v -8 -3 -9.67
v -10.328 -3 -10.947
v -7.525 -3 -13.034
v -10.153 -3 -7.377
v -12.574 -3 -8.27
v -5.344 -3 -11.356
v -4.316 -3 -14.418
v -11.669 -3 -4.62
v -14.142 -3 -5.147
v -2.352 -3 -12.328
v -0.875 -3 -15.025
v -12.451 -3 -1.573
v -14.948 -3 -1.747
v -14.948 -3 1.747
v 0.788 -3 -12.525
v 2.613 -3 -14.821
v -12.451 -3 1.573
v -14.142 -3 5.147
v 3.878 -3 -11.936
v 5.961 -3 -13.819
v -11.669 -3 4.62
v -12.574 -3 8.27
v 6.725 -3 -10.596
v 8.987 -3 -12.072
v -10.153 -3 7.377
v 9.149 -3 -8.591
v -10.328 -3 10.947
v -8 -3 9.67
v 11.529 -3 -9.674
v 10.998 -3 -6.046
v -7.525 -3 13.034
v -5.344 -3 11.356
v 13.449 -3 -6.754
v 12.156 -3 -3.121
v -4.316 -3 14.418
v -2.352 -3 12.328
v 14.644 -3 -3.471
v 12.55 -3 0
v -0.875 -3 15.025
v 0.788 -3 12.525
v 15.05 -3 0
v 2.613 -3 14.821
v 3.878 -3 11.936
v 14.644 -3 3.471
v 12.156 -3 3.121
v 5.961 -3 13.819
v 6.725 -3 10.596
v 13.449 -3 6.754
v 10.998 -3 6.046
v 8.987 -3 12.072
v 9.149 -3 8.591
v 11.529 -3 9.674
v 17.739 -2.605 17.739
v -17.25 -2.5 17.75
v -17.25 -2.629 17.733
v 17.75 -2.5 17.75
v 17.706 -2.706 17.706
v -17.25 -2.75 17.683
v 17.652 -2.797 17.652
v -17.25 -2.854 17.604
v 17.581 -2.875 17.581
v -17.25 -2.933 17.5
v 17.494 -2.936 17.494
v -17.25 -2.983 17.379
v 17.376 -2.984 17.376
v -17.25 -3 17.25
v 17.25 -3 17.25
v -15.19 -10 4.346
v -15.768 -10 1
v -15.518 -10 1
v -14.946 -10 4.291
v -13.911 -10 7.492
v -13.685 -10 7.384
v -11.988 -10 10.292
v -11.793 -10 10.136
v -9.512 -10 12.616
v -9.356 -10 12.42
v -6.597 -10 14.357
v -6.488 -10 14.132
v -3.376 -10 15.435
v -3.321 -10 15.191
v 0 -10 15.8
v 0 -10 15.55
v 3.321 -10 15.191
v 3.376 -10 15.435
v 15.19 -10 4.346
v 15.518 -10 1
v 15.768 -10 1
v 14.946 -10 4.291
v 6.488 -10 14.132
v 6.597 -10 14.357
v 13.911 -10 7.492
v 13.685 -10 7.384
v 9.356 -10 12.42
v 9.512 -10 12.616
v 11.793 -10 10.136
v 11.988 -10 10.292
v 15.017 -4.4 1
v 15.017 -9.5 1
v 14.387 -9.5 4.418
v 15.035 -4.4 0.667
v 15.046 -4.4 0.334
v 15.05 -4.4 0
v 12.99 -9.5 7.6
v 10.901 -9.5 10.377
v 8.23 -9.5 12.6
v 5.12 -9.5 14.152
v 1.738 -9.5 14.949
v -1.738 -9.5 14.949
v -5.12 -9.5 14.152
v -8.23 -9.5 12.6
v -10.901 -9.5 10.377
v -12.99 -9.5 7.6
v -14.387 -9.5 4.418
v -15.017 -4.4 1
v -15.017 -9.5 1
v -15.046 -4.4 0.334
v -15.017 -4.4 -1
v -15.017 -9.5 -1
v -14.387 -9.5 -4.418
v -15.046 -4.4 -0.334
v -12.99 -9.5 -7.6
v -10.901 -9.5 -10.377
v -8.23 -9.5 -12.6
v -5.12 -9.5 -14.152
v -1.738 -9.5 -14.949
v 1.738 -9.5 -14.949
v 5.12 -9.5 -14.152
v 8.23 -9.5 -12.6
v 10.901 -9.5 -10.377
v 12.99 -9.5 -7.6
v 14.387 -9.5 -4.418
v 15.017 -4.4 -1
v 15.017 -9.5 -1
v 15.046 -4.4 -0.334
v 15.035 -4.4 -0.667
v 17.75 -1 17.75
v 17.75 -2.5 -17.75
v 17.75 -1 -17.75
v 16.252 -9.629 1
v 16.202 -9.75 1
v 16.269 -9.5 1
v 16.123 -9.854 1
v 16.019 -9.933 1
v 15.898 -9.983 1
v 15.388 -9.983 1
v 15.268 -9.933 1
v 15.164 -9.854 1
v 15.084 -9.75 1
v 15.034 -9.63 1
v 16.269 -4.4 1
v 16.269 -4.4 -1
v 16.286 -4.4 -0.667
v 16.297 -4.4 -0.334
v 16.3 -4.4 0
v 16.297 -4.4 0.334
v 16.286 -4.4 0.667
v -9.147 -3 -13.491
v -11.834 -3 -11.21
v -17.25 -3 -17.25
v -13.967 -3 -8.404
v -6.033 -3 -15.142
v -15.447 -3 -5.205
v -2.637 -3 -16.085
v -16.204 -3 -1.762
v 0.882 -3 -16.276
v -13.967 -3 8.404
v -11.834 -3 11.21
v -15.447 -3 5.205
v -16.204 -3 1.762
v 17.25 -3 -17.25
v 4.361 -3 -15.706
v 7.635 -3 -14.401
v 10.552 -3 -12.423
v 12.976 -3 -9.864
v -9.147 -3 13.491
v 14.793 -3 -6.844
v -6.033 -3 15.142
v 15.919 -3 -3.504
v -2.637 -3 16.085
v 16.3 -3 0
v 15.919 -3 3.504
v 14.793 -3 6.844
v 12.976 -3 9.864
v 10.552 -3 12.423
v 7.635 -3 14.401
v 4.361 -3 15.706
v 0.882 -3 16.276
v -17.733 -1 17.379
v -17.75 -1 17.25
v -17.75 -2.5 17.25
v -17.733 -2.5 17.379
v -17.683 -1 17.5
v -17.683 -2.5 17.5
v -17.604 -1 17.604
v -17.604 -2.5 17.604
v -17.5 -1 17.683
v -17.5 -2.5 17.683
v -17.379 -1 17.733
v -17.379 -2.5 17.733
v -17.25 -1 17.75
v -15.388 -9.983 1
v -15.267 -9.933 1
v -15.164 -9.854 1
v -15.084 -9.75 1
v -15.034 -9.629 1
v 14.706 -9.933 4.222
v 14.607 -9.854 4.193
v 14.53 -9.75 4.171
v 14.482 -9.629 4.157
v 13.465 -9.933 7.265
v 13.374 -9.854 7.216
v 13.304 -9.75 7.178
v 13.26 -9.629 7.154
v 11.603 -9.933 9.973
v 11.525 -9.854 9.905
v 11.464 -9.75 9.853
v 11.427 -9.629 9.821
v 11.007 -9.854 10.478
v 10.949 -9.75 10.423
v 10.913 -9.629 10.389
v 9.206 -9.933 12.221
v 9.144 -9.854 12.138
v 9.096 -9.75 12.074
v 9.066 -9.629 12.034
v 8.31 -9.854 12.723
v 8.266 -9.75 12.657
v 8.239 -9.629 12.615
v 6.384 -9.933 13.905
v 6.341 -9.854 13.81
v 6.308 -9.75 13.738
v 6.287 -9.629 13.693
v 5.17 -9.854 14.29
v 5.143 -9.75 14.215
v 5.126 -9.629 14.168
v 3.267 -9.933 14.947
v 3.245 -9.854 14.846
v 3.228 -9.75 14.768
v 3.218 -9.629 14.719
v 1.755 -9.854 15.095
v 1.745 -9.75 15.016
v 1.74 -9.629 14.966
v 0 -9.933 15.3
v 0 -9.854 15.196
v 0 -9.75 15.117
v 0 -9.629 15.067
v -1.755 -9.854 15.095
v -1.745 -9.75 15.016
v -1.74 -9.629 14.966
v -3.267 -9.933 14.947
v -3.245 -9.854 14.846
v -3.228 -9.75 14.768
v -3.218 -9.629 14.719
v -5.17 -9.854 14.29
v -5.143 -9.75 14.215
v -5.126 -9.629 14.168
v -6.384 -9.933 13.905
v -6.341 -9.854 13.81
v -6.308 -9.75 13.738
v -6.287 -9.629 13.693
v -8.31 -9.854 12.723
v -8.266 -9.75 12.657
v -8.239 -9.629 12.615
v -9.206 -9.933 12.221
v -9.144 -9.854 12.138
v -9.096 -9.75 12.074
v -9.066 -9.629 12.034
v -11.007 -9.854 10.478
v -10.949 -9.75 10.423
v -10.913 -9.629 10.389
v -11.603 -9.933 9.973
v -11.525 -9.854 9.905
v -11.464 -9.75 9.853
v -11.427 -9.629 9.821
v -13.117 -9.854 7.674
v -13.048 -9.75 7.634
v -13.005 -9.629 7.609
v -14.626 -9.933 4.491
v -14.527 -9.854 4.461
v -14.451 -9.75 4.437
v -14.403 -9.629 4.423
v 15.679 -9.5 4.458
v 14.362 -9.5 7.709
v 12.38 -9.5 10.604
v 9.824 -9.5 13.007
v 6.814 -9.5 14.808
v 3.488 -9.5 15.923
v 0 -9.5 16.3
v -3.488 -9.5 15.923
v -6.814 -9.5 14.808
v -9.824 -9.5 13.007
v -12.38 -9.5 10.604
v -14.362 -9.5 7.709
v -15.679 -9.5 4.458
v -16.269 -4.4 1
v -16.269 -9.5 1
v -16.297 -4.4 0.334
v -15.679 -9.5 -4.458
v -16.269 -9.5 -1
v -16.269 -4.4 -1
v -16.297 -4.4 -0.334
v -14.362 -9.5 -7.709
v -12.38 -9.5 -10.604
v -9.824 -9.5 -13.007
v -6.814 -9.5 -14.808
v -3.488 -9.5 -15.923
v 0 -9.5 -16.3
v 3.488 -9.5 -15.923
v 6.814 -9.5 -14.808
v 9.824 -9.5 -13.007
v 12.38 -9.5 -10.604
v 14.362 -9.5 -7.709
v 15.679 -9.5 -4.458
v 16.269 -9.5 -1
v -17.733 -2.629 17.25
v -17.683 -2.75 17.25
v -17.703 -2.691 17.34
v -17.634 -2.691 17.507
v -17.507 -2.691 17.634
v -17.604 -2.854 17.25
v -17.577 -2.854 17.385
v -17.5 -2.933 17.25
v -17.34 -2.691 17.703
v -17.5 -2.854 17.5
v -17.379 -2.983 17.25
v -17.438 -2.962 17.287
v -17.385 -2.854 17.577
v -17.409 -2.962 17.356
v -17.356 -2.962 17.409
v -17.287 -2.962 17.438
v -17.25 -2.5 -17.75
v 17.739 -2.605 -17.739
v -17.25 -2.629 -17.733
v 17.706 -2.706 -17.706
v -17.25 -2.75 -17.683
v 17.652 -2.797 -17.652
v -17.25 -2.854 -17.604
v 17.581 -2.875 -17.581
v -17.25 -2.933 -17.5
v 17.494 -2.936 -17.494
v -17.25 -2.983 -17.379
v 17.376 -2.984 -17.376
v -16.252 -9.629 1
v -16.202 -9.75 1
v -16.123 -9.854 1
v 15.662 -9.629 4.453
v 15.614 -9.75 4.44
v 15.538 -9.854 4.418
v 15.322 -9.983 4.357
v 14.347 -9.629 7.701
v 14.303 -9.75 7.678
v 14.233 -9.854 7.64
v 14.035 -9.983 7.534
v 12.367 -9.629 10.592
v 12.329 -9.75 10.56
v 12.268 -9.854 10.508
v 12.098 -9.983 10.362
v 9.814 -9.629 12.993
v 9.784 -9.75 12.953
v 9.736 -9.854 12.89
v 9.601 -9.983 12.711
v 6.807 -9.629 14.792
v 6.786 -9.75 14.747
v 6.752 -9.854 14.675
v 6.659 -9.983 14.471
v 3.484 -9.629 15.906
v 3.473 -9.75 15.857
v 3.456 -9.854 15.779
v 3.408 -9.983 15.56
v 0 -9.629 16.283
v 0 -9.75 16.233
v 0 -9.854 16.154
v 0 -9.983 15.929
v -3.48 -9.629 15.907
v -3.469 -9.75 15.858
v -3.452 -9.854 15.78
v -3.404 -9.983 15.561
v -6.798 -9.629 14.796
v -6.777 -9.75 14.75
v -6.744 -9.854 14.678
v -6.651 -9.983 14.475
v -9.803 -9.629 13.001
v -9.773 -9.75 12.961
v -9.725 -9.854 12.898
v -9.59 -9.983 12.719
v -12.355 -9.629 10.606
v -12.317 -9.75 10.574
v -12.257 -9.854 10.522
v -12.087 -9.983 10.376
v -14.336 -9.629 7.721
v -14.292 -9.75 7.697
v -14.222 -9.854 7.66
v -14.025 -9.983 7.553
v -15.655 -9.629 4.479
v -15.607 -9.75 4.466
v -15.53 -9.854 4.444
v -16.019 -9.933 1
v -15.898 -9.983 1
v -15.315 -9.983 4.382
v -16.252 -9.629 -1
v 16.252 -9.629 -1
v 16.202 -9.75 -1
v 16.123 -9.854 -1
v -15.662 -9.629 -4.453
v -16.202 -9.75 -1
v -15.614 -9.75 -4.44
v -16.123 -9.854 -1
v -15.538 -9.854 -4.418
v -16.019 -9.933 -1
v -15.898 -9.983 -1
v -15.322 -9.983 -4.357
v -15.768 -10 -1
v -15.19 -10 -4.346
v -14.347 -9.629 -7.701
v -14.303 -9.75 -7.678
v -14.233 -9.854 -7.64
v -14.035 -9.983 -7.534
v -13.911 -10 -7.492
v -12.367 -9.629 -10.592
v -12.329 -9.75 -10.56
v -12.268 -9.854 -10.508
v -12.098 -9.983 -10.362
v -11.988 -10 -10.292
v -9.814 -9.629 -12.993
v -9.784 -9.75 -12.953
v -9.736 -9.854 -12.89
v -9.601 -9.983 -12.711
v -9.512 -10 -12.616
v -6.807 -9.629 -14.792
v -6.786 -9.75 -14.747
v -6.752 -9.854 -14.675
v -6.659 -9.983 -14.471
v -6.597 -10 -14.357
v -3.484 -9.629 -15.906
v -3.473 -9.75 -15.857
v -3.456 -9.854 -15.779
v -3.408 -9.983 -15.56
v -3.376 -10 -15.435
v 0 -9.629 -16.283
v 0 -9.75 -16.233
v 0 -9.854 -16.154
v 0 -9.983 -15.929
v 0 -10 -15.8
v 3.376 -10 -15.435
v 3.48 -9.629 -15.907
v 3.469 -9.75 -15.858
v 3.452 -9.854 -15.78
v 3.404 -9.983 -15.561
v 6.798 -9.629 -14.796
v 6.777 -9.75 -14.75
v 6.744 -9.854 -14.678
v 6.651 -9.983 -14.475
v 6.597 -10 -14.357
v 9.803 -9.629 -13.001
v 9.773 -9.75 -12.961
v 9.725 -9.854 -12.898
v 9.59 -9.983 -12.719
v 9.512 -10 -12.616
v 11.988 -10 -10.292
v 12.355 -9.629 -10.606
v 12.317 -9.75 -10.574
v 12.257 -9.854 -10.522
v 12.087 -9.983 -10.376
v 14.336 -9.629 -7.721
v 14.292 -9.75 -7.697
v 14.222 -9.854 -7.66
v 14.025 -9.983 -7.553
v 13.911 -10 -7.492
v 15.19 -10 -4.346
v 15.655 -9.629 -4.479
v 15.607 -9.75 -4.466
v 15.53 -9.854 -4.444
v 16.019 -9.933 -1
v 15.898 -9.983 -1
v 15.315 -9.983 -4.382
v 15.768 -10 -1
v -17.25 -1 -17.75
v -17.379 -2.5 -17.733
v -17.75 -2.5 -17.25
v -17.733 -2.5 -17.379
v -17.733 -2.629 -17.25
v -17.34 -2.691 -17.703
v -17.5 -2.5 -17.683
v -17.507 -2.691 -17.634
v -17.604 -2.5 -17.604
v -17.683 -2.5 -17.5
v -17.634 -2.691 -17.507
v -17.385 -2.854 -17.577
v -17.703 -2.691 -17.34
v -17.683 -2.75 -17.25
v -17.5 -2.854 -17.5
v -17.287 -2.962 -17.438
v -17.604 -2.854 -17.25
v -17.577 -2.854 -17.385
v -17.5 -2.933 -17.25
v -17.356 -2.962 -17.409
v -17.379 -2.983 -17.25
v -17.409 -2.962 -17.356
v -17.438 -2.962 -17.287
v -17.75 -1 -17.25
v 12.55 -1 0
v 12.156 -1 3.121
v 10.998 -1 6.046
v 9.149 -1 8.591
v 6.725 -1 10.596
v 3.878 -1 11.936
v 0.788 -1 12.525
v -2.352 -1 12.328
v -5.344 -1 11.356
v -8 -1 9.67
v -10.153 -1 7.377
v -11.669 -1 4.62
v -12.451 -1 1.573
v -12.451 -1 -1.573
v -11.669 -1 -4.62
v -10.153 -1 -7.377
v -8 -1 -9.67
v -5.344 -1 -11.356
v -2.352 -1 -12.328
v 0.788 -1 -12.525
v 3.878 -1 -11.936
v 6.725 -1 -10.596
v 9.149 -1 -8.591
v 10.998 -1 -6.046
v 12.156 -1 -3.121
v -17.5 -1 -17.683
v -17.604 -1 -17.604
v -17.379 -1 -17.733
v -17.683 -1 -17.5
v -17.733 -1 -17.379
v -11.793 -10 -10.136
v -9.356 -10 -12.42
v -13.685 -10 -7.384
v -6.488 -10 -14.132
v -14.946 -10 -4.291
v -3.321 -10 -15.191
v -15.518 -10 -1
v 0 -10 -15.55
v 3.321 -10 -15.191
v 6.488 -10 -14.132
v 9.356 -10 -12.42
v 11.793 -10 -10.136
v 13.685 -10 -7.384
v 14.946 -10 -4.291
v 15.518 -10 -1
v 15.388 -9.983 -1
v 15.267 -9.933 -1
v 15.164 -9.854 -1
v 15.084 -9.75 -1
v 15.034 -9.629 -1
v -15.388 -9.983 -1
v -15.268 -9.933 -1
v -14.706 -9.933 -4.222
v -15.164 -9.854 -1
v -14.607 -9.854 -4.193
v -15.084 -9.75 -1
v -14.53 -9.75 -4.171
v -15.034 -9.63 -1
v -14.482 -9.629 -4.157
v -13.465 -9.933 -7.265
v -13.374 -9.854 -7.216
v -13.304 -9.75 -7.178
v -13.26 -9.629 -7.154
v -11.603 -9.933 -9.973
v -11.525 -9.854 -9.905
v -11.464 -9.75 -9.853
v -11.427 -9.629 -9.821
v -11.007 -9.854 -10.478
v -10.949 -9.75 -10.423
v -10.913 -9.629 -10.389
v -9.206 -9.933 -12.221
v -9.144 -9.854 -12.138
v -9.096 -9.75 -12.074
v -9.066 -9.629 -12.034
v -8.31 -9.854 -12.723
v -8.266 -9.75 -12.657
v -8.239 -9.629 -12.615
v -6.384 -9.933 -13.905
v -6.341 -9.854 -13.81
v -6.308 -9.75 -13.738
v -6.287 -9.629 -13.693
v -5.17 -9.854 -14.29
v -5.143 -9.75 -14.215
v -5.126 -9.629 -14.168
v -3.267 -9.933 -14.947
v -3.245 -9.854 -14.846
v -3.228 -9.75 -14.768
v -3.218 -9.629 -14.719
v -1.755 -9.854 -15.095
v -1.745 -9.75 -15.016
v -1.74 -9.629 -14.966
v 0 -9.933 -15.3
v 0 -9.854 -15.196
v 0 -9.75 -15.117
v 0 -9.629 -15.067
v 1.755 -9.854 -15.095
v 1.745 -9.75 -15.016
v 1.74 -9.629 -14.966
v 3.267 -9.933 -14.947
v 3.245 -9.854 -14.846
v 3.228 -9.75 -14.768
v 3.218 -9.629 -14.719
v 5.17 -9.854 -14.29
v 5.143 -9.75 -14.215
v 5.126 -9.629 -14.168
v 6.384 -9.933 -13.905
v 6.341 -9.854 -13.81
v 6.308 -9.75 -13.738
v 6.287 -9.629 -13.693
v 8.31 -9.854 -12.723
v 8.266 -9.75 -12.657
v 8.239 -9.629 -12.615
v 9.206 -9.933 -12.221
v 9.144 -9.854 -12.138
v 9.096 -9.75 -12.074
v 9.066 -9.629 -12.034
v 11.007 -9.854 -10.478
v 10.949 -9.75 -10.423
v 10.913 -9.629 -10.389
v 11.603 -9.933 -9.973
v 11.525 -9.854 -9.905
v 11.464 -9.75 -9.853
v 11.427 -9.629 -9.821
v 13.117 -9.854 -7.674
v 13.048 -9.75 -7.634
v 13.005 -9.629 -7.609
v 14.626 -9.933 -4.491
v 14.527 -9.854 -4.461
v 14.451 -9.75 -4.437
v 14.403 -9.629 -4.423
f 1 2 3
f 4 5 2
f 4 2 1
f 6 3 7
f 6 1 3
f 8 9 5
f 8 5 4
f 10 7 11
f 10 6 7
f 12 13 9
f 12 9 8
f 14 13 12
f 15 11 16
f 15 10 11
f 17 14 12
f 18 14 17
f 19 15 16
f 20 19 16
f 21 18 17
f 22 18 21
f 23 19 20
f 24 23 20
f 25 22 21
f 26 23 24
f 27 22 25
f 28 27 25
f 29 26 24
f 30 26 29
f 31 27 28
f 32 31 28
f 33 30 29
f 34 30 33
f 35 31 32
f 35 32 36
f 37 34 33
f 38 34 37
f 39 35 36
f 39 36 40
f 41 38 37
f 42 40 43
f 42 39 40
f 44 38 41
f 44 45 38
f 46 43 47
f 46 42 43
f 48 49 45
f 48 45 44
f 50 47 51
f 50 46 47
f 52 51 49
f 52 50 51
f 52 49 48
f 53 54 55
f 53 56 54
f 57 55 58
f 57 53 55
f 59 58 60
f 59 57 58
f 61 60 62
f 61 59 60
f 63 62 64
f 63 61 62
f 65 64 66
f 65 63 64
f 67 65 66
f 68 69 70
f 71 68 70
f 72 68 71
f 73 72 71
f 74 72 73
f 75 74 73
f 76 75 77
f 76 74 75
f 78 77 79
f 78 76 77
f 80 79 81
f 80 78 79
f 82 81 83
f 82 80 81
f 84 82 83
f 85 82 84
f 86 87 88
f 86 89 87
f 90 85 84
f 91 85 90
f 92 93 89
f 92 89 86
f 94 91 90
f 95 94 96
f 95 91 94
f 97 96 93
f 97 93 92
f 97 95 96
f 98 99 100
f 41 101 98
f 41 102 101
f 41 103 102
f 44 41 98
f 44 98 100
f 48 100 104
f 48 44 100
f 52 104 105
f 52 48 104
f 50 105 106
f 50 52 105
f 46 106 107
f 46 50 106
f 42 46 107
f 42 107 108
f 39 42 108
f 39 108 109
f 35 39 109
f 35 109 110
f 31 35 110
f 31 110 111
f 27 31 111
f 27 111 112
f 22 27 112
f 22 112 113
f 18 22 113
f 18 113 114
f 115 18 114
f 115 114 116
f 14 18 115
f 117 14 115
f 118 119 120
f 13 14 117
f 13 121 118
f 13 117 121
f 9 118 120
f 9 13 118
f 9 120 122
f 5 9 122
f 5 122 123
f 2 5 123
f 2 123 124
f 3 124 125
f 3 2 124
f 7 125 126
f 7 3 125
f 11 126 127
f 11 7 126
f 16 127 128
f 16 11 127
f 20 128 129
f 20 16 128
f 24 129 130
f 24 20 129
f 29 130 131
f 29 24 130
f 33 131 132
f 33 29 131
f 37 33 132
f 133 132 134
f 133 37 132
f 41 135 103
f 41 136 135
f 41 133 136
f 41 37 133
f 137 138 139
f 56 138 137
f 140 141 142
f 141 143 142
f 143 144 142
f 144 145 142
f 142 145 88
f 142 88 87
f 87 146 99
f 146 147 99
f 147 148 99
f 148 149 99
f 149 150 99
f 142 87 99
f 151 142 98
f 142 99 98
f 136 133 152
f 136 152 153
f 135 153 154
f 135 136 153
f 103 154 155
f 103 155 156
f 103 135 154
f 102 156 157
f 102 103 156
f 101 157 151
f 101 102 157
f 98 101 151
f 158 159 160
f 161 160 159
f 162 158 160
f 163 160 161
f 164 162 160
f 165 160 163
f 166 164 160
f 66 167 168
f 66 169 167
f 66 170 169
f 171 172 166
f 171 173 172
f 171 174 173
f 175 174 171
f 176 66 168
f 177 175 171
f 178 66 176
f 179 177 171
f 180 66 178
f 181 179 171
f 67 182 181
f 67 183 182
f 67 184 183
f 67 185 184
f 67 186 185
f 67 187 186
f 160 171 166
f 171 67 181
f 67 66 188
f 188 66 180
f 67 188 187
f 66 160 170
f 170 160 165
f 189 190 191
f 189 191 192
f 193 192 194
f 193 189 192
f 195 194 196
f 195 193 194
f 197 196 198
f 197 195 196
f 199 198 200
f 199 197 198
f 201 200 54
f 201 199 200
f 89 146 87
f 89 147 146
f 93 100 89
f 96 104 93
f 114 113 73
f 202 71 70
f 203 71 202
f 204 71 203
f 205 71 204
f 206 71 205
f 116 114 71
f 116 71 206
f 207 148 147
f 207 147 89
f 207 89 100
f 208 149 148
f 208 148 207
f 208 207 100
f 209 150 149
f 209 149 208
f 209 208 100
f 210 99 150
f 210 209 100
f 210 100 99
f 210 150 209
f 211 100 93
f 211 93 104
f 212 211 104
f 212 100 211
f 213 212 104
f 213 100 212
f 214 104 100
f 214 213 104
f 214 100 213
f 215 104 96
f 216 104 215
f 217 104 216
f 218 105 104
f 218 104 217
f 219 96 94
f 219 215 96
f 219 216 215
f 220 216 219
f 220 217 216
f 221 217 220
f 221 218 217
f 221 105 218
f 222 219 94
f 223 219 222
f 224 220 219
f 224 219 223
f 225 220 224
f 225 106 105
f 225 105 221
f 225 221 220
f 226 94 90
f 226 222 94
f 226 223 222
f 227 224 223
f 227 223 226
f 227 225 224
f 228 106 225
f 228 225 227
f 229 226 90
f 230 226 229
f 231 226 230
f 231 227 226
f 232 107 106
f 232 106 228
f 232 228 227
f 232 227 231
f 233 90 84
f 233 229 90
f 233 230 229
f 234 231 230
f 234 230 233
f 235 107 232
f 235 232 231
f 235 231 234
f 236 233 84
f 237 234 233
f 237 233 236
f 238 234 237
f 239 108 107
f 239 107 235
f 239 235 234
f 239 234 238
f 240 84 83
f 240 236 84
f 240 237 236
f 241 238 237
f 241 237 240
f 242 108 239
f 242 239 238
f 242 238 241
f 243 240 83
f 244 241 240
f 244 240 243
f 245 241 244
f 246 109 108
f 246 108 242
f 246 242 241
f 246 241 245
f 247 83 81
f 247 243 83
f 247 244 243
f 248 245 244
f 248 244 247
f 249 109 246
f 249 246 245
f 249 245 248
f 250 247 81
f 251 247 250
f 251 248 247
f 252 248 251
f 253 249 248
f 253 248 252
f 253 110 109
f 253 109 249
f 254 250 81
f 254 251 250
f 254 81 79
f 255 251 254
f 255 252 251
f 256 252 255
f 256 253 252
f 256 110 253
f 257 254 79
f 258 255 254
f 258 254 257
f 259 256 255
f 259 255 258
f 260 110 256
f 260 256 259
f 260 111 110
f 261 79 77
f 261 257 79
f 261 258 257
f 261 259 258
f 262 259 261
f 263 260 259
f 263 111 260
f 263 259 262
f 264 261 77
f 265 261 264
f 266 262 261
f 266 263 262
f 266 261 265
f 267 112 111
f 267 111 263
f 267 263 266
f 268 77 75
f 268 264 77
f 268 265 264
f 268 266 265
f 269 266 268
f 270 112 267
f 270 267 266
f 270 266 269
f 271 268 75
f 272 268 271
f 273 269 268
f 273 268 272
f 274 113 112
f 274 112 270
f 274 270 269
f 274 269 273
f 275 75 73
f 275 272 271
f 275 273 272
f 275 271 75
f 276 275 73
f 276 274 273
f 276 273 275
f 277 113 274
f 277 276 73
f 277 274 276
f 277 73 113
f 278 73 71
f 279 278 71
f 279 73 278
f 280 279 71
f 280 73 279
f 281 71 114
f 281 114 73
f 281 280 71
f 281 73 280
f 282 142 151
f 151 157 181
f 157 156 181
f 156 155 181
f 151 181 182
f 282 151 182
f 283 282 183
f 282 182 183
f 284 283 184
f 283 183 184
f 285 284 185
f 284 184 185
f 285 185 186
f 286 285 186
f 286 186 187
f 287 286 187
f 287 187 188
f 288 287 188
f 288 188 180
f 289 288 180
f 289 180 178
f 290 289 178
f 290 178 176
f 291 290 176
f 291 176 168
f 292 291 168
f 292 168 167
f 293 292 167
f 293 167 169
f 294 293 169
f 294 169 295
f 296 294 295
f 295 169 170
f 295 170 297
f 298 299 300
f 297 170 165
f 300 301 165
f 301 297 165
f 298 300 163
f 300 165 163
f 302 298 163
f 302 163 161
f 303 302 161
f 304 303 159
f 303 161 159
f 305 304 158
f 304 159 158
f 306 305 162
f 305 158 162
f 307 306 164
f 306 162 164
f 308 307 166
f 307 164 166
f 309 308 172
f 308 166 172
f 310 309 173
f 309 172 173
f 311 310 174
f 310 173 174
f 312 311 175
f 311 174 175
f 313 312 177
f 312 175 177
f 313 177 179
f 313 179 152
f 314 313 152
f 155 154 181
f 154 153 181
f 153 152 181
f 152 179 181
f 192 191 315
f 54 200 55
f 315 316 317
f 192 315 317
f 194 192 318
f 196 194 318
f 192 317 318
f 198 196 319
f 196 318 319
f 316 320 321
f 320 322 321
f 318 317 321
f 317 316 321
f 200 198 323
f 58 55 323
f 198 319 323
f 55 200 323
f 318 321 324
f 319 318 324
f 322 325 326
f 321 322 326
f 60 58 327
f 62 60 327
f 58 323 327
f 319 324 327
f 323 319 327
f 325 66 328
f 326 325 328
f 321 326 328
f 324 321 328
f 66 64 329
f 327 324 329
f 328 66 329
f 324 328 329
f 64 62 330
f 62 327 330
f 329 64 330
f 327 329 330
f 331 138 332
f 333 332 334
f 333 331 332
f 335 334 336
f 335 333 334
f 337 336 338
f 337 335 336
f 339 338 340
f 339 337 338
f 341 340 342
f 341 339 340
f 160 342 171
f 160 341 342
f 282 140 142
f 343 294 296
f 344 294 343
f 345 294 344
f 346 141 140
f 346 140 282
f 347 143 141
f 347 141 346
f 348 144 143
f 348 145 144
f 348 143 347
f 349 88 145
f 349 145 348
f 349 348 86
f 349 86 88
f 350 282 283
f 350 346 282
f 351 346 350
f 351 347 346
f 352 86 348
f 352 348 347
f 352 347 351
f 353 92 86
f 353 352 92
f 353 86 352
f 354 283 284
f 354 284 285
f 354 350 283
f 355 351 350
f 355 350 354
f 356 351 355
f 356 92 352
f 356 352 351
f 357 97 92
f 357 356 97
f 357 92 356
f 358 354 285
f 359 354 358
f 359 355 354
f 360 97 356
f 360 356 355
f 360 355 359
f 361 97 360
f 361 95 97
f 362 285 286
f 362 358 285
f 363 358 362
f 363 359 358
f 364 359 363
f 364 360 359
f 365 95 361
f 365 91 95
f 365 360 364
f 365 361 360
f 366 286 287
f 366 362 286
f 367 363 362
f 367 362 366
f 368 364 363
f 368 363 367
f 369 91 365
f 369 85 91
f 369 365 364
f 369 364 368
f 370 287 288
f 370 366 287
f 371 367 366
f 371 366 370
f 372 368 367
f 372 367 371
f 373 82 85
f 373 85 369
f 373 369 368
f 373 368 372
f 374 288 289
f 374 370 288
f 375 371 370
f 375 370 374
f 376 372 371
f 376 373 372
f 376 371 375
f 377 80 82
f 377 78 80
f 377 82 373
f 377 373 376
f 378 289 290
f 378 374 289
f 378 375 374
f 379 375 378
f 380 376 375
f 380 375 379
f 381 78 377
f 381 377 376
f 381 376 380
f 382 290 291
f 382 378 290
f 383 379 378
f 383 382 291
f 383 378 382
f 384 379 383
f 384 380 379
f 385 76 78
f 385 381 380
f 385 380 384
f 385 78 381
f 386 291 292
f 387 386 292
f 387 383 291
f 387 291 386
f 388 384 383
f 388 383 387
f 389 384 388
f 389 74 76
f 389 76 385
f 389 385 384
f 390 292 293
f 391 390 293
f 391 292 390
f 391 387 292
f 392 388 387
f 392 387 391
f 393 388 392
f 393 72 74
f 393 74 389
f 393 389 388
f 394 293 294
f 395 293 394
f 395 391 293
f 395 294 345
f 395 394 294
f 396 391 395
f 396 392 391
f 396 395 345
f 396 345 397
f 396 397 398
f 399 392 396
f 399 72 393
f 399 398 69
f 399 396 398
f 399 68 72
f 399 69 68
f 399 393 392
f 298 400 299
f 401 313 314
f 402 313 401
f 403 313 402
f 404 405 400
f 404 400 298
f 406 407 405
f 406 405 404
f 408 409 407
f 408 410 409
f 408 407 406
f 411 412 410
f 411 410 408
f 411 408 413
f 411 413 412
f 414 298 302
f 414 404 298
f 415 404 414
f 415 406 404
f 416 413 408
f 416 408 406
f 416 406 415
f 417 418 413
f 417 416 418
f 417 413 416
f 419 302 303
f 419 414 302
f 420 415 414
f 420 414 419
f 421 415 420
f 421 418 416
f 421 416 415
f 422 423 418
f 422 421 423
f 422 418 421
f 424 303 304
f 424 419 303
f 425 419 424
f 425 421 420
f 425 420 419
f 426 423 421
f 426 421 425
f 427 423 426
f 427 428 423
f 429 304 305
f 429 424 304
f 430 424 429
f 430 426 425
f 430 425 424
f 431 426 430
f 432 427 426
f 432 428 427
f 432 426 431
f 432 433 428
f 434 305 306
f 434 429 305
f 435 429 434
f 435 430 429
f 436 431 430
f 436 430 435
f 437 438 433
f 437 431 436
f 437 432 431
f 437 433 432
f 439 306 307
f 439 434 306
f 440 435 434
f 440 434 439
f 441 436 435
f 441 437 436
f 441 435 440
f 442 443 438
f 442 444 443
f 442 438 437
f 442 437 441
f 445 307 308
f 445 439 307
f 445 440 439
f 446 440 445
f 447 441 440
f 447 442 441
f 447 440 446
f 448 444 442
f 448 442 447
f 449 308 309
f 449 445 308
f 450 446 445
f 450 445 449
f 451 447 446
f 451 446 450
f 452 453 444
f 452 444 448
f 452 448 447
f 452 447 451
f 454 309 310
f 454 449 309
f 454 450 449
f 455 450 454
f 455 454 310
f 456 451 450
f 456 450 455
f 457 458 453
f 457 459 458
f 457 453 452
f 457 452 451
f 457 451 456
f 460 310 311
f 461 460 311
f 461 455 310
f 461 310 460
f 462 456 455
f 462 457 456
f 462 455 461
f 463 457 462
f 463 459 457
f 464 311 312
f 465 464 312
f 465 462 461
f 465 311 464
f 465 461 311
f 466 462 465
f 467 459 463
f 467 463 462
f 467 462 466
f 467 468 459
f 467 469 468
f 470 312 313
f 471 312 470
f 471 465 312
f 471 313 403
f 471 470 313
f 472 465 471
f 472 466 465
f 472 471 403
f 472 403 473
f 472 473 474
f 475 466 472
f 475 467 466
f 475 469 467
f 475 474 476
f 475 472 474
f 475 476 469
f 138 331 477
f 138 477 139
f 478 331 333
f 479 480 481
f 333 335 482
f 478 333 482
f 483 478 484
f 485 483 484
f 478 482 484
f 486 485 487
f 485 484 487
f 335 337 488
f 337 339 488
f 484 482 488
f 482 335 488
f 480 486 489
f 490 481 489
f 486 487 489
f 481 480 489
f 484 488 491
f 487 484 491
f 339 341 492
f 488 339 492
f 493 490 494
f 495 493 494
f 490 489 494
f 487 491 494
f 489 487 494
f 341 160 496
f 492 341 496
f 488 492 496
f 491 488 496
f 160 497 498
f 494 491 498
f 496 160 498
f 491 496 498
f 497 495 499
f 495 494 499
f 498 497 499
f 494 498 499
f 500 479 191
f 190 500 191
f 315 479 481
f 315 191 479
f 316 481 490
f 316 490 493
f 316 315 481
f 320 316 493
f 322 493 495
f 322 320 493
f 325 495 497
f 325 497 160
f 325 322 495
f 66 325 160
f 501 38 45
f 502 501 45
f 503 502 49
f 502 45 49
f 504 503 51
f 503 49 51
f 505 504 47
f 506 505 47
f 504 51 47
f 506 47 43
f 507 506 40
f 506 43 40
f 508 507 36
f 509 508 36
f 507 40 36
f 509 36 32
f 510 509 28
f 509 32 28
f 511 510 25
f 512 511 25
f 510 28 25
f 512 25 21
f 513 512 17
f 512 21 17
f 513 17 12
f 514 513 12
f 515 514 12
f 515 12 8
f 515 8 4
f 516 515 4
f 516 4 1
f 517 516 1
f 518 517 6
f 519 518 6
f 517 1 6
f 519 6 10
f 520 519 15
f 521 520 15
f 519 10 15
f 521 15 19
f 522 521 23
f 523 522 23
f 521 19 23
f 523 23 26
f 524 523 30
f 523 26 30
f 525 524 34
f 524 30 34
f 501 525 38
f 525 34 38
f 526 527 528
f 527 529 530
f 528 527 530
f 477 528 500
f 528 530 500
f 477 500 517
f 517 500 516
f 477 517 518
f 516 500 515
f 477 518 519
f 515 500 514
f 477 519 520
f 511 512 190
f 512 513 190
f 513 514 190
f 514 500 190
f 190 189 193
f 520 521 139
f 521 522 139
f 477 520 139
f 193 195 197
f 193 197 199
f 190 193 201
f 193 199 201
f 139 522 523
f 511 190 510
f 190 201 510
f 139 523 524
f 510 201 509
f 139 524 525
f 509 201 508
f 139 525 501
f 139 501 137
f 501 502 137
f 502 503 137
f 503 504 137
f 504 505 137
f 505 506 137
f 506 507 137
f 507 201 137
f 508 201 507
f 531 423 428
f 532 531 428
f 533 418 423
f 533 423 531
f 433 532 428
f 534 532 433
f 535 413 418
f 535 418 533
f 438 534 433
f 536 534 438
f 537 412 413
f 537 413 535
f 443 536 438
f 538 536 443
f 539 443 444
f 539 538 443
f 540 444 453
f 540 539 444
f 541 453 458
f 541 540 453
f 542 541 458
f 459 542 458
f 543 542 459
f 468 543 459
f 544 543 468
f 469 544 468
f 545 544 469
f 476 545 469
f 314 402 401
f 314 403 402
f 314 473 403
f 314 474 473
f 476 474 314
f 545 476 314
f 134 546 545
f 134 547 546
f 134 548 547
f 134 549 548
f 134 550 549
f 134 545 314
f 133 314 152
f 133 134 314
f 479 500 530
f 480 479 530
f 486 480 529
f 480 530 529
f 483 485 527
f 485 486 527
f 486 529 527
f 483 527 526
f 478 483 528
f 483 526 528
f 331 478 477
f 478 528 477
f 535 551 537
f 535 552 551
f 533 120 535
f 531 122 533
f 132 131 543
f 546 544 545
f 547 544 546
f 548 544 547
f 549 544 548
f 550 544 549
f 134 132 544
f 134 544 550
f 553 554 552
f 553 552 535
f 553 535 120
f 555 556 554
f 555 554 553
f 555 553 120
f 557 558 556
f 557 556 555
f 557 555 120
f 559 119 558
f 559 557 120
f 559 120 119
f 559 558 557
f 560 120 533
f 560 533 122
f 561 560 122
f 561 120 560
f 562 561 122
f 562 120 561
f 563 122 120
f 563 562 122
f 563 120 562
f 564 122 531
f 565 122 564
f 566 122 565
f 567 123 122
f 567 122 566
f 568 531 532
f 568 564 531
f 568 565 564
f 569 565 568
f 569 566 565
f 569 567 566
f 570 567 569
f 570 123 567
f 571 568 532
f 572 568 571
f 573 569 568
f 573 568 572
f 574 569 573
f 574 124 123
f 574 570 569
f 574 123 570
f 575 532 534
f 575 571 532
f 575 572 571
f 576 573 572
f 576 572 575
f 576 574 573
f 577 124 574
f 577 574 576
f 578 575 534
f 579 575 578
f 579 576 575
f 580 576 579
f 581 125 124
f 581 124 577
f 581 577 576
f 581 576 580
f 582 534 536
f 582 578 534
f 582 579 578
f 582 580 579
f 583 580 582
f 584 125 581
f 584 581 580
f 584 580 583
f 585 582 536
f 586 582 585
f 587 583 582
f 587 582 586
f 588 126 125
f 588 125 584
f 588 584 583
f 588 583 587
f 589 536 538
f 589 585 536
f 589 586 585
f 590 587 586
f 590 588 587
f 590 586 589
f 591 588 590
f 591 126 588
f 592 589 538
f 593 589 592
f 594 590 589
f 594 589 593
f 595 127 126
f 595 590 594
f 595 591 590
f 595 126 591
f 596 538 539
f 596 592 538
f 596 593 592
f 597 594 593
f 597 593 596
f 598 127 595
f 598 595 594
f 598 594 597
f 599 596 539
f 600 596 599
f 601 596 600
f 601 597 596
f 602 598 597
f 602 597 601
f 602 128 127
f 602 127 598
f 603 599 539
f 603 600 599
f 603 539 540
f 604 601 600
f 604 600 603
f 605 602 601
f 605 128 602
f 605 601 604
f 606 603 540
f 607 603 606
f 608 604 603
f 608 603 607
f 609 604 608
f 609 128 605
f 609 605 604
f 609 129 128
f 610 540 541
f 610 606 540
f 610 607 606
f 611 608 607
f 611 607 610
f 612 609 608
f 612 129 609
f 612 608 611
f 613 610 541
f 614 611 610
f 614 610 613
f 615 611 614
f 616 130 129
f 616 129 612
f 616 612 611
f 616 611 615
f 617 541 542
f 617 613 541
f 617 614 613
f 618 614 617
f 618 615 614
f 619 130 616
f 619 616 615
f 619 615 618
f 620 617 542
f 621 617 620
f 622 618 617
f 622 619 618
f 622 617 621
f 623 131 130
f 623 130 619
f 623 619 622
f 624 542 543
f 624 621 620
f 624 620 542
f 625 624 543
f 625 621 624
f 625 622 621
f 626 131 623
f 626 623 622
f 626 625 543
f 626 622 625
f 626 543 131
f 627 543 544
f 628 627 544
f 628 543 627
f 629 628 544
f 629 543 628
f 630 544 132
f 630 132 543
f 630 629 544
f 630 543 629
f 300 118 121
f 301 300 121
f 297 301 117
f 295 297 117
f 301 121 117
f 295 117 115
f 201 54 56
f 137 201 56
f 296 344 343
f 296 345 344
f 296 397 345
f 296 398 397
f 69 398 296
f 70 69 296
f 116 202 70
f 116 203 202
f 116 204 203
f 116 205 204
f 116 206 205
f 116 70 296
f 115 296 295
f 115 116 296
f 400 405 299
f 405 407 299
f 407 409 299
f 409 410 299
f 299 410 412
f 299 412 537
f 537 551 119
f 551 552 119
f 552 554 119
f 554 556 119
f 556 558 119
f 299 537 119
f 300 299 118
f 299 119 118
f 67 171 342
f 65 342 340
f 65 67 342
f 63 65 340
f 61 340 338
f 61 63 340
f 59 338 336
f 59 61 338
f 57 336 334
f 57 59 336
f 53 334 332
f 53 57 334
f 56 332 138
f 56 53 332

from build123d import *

# Parameters (mm, degrees)
SKETCH_R          = 16.3
SKETCH_R_2        = 15.05
PAD_DEPTH         = 7
SKETCH001_W       = 35.5
SKETCH001_H       = 35.5
SKETCH001_R       = 12.55
PAD001_DEPTH      = 2
SKETCH002_W       = 5.6
SKETCH002_H       = 2
POCKET_DEPTH      = 25
POCKET_DEPTH_BACK = 25
FILLET002_R       = 0.5
FILLET003_R       = 0.5
FILLET004_R       = 0.5


with BuildPart() as part:
    # Sketch → Pad (new body)
    with BuildSketch(Plane.XZ):
        Circle(SKETCH_R)
        Circle(SKETCH_R_2, mode=Mode.SUBTRACT)
    extrude(amount=PAD_DEPTH)

    # Sketch001 → Pad001 (join)
    with BuildSketch(Plane.XZ):
        Rectangle(SKETCH001_W, SKETCH001_H)
        Circle(SKETCH001_R, mode=Mode.SUBTRACT)
    extrude(amount=-PAD001_DEPTH)

    # Sketch002 (on DatumPlane) → Pocket (cut, two sides)
    with BuildSketch(Plane.YZ) as pocket_sk:
        with Locations((-4.2, 0)):
            Rectangle(SKETCH002_W, SKETCH002_H)
    extrude(amount=-POCKET_DEPTH, mode=Mode.SUBTRACT)
    extrude(pocket_sk.sketch, amount=POCKET_DEPTH_BACK, mode=Mode.SUBTRACT)

    # Fillet002
    fillet002_edges = [part.edges().sort_by_distance(p)[0] for p in [
        (-17.75, 1, -17.75),
        (-17.75, 1, 17.75),
    ]]
    fillet(fillet002_edges, radius=FILLET002_R)

    # Fillet003
    fillet003_edges = [part.edges().sort_by_distance(p)[0] for p in [
        (-17.75, 0, 0),
        (0.25, 0, 17.75),
        (0.25, 0, -17.75),
        (17.75, 0, 0),
    ]]
    fillet(fillet003_edges, radius=FILLET003_R)

    # Fillet004
    fillet004_edges = [part.edges().sort_by_distance(p)[0] for p in [
        (0, -7, 15.05),
        (0, -7, 16.3),
        (0, -7, -16.3),
        (0, -7, -15.05),
    ]]
    fillet(fillet004_edges, radius=FILLET004_R)


with BuildPart() as part_1:
    # Body placement: moved
    add(part.part.moved(Location((0, -3, 0))))


solid = part_1.part
